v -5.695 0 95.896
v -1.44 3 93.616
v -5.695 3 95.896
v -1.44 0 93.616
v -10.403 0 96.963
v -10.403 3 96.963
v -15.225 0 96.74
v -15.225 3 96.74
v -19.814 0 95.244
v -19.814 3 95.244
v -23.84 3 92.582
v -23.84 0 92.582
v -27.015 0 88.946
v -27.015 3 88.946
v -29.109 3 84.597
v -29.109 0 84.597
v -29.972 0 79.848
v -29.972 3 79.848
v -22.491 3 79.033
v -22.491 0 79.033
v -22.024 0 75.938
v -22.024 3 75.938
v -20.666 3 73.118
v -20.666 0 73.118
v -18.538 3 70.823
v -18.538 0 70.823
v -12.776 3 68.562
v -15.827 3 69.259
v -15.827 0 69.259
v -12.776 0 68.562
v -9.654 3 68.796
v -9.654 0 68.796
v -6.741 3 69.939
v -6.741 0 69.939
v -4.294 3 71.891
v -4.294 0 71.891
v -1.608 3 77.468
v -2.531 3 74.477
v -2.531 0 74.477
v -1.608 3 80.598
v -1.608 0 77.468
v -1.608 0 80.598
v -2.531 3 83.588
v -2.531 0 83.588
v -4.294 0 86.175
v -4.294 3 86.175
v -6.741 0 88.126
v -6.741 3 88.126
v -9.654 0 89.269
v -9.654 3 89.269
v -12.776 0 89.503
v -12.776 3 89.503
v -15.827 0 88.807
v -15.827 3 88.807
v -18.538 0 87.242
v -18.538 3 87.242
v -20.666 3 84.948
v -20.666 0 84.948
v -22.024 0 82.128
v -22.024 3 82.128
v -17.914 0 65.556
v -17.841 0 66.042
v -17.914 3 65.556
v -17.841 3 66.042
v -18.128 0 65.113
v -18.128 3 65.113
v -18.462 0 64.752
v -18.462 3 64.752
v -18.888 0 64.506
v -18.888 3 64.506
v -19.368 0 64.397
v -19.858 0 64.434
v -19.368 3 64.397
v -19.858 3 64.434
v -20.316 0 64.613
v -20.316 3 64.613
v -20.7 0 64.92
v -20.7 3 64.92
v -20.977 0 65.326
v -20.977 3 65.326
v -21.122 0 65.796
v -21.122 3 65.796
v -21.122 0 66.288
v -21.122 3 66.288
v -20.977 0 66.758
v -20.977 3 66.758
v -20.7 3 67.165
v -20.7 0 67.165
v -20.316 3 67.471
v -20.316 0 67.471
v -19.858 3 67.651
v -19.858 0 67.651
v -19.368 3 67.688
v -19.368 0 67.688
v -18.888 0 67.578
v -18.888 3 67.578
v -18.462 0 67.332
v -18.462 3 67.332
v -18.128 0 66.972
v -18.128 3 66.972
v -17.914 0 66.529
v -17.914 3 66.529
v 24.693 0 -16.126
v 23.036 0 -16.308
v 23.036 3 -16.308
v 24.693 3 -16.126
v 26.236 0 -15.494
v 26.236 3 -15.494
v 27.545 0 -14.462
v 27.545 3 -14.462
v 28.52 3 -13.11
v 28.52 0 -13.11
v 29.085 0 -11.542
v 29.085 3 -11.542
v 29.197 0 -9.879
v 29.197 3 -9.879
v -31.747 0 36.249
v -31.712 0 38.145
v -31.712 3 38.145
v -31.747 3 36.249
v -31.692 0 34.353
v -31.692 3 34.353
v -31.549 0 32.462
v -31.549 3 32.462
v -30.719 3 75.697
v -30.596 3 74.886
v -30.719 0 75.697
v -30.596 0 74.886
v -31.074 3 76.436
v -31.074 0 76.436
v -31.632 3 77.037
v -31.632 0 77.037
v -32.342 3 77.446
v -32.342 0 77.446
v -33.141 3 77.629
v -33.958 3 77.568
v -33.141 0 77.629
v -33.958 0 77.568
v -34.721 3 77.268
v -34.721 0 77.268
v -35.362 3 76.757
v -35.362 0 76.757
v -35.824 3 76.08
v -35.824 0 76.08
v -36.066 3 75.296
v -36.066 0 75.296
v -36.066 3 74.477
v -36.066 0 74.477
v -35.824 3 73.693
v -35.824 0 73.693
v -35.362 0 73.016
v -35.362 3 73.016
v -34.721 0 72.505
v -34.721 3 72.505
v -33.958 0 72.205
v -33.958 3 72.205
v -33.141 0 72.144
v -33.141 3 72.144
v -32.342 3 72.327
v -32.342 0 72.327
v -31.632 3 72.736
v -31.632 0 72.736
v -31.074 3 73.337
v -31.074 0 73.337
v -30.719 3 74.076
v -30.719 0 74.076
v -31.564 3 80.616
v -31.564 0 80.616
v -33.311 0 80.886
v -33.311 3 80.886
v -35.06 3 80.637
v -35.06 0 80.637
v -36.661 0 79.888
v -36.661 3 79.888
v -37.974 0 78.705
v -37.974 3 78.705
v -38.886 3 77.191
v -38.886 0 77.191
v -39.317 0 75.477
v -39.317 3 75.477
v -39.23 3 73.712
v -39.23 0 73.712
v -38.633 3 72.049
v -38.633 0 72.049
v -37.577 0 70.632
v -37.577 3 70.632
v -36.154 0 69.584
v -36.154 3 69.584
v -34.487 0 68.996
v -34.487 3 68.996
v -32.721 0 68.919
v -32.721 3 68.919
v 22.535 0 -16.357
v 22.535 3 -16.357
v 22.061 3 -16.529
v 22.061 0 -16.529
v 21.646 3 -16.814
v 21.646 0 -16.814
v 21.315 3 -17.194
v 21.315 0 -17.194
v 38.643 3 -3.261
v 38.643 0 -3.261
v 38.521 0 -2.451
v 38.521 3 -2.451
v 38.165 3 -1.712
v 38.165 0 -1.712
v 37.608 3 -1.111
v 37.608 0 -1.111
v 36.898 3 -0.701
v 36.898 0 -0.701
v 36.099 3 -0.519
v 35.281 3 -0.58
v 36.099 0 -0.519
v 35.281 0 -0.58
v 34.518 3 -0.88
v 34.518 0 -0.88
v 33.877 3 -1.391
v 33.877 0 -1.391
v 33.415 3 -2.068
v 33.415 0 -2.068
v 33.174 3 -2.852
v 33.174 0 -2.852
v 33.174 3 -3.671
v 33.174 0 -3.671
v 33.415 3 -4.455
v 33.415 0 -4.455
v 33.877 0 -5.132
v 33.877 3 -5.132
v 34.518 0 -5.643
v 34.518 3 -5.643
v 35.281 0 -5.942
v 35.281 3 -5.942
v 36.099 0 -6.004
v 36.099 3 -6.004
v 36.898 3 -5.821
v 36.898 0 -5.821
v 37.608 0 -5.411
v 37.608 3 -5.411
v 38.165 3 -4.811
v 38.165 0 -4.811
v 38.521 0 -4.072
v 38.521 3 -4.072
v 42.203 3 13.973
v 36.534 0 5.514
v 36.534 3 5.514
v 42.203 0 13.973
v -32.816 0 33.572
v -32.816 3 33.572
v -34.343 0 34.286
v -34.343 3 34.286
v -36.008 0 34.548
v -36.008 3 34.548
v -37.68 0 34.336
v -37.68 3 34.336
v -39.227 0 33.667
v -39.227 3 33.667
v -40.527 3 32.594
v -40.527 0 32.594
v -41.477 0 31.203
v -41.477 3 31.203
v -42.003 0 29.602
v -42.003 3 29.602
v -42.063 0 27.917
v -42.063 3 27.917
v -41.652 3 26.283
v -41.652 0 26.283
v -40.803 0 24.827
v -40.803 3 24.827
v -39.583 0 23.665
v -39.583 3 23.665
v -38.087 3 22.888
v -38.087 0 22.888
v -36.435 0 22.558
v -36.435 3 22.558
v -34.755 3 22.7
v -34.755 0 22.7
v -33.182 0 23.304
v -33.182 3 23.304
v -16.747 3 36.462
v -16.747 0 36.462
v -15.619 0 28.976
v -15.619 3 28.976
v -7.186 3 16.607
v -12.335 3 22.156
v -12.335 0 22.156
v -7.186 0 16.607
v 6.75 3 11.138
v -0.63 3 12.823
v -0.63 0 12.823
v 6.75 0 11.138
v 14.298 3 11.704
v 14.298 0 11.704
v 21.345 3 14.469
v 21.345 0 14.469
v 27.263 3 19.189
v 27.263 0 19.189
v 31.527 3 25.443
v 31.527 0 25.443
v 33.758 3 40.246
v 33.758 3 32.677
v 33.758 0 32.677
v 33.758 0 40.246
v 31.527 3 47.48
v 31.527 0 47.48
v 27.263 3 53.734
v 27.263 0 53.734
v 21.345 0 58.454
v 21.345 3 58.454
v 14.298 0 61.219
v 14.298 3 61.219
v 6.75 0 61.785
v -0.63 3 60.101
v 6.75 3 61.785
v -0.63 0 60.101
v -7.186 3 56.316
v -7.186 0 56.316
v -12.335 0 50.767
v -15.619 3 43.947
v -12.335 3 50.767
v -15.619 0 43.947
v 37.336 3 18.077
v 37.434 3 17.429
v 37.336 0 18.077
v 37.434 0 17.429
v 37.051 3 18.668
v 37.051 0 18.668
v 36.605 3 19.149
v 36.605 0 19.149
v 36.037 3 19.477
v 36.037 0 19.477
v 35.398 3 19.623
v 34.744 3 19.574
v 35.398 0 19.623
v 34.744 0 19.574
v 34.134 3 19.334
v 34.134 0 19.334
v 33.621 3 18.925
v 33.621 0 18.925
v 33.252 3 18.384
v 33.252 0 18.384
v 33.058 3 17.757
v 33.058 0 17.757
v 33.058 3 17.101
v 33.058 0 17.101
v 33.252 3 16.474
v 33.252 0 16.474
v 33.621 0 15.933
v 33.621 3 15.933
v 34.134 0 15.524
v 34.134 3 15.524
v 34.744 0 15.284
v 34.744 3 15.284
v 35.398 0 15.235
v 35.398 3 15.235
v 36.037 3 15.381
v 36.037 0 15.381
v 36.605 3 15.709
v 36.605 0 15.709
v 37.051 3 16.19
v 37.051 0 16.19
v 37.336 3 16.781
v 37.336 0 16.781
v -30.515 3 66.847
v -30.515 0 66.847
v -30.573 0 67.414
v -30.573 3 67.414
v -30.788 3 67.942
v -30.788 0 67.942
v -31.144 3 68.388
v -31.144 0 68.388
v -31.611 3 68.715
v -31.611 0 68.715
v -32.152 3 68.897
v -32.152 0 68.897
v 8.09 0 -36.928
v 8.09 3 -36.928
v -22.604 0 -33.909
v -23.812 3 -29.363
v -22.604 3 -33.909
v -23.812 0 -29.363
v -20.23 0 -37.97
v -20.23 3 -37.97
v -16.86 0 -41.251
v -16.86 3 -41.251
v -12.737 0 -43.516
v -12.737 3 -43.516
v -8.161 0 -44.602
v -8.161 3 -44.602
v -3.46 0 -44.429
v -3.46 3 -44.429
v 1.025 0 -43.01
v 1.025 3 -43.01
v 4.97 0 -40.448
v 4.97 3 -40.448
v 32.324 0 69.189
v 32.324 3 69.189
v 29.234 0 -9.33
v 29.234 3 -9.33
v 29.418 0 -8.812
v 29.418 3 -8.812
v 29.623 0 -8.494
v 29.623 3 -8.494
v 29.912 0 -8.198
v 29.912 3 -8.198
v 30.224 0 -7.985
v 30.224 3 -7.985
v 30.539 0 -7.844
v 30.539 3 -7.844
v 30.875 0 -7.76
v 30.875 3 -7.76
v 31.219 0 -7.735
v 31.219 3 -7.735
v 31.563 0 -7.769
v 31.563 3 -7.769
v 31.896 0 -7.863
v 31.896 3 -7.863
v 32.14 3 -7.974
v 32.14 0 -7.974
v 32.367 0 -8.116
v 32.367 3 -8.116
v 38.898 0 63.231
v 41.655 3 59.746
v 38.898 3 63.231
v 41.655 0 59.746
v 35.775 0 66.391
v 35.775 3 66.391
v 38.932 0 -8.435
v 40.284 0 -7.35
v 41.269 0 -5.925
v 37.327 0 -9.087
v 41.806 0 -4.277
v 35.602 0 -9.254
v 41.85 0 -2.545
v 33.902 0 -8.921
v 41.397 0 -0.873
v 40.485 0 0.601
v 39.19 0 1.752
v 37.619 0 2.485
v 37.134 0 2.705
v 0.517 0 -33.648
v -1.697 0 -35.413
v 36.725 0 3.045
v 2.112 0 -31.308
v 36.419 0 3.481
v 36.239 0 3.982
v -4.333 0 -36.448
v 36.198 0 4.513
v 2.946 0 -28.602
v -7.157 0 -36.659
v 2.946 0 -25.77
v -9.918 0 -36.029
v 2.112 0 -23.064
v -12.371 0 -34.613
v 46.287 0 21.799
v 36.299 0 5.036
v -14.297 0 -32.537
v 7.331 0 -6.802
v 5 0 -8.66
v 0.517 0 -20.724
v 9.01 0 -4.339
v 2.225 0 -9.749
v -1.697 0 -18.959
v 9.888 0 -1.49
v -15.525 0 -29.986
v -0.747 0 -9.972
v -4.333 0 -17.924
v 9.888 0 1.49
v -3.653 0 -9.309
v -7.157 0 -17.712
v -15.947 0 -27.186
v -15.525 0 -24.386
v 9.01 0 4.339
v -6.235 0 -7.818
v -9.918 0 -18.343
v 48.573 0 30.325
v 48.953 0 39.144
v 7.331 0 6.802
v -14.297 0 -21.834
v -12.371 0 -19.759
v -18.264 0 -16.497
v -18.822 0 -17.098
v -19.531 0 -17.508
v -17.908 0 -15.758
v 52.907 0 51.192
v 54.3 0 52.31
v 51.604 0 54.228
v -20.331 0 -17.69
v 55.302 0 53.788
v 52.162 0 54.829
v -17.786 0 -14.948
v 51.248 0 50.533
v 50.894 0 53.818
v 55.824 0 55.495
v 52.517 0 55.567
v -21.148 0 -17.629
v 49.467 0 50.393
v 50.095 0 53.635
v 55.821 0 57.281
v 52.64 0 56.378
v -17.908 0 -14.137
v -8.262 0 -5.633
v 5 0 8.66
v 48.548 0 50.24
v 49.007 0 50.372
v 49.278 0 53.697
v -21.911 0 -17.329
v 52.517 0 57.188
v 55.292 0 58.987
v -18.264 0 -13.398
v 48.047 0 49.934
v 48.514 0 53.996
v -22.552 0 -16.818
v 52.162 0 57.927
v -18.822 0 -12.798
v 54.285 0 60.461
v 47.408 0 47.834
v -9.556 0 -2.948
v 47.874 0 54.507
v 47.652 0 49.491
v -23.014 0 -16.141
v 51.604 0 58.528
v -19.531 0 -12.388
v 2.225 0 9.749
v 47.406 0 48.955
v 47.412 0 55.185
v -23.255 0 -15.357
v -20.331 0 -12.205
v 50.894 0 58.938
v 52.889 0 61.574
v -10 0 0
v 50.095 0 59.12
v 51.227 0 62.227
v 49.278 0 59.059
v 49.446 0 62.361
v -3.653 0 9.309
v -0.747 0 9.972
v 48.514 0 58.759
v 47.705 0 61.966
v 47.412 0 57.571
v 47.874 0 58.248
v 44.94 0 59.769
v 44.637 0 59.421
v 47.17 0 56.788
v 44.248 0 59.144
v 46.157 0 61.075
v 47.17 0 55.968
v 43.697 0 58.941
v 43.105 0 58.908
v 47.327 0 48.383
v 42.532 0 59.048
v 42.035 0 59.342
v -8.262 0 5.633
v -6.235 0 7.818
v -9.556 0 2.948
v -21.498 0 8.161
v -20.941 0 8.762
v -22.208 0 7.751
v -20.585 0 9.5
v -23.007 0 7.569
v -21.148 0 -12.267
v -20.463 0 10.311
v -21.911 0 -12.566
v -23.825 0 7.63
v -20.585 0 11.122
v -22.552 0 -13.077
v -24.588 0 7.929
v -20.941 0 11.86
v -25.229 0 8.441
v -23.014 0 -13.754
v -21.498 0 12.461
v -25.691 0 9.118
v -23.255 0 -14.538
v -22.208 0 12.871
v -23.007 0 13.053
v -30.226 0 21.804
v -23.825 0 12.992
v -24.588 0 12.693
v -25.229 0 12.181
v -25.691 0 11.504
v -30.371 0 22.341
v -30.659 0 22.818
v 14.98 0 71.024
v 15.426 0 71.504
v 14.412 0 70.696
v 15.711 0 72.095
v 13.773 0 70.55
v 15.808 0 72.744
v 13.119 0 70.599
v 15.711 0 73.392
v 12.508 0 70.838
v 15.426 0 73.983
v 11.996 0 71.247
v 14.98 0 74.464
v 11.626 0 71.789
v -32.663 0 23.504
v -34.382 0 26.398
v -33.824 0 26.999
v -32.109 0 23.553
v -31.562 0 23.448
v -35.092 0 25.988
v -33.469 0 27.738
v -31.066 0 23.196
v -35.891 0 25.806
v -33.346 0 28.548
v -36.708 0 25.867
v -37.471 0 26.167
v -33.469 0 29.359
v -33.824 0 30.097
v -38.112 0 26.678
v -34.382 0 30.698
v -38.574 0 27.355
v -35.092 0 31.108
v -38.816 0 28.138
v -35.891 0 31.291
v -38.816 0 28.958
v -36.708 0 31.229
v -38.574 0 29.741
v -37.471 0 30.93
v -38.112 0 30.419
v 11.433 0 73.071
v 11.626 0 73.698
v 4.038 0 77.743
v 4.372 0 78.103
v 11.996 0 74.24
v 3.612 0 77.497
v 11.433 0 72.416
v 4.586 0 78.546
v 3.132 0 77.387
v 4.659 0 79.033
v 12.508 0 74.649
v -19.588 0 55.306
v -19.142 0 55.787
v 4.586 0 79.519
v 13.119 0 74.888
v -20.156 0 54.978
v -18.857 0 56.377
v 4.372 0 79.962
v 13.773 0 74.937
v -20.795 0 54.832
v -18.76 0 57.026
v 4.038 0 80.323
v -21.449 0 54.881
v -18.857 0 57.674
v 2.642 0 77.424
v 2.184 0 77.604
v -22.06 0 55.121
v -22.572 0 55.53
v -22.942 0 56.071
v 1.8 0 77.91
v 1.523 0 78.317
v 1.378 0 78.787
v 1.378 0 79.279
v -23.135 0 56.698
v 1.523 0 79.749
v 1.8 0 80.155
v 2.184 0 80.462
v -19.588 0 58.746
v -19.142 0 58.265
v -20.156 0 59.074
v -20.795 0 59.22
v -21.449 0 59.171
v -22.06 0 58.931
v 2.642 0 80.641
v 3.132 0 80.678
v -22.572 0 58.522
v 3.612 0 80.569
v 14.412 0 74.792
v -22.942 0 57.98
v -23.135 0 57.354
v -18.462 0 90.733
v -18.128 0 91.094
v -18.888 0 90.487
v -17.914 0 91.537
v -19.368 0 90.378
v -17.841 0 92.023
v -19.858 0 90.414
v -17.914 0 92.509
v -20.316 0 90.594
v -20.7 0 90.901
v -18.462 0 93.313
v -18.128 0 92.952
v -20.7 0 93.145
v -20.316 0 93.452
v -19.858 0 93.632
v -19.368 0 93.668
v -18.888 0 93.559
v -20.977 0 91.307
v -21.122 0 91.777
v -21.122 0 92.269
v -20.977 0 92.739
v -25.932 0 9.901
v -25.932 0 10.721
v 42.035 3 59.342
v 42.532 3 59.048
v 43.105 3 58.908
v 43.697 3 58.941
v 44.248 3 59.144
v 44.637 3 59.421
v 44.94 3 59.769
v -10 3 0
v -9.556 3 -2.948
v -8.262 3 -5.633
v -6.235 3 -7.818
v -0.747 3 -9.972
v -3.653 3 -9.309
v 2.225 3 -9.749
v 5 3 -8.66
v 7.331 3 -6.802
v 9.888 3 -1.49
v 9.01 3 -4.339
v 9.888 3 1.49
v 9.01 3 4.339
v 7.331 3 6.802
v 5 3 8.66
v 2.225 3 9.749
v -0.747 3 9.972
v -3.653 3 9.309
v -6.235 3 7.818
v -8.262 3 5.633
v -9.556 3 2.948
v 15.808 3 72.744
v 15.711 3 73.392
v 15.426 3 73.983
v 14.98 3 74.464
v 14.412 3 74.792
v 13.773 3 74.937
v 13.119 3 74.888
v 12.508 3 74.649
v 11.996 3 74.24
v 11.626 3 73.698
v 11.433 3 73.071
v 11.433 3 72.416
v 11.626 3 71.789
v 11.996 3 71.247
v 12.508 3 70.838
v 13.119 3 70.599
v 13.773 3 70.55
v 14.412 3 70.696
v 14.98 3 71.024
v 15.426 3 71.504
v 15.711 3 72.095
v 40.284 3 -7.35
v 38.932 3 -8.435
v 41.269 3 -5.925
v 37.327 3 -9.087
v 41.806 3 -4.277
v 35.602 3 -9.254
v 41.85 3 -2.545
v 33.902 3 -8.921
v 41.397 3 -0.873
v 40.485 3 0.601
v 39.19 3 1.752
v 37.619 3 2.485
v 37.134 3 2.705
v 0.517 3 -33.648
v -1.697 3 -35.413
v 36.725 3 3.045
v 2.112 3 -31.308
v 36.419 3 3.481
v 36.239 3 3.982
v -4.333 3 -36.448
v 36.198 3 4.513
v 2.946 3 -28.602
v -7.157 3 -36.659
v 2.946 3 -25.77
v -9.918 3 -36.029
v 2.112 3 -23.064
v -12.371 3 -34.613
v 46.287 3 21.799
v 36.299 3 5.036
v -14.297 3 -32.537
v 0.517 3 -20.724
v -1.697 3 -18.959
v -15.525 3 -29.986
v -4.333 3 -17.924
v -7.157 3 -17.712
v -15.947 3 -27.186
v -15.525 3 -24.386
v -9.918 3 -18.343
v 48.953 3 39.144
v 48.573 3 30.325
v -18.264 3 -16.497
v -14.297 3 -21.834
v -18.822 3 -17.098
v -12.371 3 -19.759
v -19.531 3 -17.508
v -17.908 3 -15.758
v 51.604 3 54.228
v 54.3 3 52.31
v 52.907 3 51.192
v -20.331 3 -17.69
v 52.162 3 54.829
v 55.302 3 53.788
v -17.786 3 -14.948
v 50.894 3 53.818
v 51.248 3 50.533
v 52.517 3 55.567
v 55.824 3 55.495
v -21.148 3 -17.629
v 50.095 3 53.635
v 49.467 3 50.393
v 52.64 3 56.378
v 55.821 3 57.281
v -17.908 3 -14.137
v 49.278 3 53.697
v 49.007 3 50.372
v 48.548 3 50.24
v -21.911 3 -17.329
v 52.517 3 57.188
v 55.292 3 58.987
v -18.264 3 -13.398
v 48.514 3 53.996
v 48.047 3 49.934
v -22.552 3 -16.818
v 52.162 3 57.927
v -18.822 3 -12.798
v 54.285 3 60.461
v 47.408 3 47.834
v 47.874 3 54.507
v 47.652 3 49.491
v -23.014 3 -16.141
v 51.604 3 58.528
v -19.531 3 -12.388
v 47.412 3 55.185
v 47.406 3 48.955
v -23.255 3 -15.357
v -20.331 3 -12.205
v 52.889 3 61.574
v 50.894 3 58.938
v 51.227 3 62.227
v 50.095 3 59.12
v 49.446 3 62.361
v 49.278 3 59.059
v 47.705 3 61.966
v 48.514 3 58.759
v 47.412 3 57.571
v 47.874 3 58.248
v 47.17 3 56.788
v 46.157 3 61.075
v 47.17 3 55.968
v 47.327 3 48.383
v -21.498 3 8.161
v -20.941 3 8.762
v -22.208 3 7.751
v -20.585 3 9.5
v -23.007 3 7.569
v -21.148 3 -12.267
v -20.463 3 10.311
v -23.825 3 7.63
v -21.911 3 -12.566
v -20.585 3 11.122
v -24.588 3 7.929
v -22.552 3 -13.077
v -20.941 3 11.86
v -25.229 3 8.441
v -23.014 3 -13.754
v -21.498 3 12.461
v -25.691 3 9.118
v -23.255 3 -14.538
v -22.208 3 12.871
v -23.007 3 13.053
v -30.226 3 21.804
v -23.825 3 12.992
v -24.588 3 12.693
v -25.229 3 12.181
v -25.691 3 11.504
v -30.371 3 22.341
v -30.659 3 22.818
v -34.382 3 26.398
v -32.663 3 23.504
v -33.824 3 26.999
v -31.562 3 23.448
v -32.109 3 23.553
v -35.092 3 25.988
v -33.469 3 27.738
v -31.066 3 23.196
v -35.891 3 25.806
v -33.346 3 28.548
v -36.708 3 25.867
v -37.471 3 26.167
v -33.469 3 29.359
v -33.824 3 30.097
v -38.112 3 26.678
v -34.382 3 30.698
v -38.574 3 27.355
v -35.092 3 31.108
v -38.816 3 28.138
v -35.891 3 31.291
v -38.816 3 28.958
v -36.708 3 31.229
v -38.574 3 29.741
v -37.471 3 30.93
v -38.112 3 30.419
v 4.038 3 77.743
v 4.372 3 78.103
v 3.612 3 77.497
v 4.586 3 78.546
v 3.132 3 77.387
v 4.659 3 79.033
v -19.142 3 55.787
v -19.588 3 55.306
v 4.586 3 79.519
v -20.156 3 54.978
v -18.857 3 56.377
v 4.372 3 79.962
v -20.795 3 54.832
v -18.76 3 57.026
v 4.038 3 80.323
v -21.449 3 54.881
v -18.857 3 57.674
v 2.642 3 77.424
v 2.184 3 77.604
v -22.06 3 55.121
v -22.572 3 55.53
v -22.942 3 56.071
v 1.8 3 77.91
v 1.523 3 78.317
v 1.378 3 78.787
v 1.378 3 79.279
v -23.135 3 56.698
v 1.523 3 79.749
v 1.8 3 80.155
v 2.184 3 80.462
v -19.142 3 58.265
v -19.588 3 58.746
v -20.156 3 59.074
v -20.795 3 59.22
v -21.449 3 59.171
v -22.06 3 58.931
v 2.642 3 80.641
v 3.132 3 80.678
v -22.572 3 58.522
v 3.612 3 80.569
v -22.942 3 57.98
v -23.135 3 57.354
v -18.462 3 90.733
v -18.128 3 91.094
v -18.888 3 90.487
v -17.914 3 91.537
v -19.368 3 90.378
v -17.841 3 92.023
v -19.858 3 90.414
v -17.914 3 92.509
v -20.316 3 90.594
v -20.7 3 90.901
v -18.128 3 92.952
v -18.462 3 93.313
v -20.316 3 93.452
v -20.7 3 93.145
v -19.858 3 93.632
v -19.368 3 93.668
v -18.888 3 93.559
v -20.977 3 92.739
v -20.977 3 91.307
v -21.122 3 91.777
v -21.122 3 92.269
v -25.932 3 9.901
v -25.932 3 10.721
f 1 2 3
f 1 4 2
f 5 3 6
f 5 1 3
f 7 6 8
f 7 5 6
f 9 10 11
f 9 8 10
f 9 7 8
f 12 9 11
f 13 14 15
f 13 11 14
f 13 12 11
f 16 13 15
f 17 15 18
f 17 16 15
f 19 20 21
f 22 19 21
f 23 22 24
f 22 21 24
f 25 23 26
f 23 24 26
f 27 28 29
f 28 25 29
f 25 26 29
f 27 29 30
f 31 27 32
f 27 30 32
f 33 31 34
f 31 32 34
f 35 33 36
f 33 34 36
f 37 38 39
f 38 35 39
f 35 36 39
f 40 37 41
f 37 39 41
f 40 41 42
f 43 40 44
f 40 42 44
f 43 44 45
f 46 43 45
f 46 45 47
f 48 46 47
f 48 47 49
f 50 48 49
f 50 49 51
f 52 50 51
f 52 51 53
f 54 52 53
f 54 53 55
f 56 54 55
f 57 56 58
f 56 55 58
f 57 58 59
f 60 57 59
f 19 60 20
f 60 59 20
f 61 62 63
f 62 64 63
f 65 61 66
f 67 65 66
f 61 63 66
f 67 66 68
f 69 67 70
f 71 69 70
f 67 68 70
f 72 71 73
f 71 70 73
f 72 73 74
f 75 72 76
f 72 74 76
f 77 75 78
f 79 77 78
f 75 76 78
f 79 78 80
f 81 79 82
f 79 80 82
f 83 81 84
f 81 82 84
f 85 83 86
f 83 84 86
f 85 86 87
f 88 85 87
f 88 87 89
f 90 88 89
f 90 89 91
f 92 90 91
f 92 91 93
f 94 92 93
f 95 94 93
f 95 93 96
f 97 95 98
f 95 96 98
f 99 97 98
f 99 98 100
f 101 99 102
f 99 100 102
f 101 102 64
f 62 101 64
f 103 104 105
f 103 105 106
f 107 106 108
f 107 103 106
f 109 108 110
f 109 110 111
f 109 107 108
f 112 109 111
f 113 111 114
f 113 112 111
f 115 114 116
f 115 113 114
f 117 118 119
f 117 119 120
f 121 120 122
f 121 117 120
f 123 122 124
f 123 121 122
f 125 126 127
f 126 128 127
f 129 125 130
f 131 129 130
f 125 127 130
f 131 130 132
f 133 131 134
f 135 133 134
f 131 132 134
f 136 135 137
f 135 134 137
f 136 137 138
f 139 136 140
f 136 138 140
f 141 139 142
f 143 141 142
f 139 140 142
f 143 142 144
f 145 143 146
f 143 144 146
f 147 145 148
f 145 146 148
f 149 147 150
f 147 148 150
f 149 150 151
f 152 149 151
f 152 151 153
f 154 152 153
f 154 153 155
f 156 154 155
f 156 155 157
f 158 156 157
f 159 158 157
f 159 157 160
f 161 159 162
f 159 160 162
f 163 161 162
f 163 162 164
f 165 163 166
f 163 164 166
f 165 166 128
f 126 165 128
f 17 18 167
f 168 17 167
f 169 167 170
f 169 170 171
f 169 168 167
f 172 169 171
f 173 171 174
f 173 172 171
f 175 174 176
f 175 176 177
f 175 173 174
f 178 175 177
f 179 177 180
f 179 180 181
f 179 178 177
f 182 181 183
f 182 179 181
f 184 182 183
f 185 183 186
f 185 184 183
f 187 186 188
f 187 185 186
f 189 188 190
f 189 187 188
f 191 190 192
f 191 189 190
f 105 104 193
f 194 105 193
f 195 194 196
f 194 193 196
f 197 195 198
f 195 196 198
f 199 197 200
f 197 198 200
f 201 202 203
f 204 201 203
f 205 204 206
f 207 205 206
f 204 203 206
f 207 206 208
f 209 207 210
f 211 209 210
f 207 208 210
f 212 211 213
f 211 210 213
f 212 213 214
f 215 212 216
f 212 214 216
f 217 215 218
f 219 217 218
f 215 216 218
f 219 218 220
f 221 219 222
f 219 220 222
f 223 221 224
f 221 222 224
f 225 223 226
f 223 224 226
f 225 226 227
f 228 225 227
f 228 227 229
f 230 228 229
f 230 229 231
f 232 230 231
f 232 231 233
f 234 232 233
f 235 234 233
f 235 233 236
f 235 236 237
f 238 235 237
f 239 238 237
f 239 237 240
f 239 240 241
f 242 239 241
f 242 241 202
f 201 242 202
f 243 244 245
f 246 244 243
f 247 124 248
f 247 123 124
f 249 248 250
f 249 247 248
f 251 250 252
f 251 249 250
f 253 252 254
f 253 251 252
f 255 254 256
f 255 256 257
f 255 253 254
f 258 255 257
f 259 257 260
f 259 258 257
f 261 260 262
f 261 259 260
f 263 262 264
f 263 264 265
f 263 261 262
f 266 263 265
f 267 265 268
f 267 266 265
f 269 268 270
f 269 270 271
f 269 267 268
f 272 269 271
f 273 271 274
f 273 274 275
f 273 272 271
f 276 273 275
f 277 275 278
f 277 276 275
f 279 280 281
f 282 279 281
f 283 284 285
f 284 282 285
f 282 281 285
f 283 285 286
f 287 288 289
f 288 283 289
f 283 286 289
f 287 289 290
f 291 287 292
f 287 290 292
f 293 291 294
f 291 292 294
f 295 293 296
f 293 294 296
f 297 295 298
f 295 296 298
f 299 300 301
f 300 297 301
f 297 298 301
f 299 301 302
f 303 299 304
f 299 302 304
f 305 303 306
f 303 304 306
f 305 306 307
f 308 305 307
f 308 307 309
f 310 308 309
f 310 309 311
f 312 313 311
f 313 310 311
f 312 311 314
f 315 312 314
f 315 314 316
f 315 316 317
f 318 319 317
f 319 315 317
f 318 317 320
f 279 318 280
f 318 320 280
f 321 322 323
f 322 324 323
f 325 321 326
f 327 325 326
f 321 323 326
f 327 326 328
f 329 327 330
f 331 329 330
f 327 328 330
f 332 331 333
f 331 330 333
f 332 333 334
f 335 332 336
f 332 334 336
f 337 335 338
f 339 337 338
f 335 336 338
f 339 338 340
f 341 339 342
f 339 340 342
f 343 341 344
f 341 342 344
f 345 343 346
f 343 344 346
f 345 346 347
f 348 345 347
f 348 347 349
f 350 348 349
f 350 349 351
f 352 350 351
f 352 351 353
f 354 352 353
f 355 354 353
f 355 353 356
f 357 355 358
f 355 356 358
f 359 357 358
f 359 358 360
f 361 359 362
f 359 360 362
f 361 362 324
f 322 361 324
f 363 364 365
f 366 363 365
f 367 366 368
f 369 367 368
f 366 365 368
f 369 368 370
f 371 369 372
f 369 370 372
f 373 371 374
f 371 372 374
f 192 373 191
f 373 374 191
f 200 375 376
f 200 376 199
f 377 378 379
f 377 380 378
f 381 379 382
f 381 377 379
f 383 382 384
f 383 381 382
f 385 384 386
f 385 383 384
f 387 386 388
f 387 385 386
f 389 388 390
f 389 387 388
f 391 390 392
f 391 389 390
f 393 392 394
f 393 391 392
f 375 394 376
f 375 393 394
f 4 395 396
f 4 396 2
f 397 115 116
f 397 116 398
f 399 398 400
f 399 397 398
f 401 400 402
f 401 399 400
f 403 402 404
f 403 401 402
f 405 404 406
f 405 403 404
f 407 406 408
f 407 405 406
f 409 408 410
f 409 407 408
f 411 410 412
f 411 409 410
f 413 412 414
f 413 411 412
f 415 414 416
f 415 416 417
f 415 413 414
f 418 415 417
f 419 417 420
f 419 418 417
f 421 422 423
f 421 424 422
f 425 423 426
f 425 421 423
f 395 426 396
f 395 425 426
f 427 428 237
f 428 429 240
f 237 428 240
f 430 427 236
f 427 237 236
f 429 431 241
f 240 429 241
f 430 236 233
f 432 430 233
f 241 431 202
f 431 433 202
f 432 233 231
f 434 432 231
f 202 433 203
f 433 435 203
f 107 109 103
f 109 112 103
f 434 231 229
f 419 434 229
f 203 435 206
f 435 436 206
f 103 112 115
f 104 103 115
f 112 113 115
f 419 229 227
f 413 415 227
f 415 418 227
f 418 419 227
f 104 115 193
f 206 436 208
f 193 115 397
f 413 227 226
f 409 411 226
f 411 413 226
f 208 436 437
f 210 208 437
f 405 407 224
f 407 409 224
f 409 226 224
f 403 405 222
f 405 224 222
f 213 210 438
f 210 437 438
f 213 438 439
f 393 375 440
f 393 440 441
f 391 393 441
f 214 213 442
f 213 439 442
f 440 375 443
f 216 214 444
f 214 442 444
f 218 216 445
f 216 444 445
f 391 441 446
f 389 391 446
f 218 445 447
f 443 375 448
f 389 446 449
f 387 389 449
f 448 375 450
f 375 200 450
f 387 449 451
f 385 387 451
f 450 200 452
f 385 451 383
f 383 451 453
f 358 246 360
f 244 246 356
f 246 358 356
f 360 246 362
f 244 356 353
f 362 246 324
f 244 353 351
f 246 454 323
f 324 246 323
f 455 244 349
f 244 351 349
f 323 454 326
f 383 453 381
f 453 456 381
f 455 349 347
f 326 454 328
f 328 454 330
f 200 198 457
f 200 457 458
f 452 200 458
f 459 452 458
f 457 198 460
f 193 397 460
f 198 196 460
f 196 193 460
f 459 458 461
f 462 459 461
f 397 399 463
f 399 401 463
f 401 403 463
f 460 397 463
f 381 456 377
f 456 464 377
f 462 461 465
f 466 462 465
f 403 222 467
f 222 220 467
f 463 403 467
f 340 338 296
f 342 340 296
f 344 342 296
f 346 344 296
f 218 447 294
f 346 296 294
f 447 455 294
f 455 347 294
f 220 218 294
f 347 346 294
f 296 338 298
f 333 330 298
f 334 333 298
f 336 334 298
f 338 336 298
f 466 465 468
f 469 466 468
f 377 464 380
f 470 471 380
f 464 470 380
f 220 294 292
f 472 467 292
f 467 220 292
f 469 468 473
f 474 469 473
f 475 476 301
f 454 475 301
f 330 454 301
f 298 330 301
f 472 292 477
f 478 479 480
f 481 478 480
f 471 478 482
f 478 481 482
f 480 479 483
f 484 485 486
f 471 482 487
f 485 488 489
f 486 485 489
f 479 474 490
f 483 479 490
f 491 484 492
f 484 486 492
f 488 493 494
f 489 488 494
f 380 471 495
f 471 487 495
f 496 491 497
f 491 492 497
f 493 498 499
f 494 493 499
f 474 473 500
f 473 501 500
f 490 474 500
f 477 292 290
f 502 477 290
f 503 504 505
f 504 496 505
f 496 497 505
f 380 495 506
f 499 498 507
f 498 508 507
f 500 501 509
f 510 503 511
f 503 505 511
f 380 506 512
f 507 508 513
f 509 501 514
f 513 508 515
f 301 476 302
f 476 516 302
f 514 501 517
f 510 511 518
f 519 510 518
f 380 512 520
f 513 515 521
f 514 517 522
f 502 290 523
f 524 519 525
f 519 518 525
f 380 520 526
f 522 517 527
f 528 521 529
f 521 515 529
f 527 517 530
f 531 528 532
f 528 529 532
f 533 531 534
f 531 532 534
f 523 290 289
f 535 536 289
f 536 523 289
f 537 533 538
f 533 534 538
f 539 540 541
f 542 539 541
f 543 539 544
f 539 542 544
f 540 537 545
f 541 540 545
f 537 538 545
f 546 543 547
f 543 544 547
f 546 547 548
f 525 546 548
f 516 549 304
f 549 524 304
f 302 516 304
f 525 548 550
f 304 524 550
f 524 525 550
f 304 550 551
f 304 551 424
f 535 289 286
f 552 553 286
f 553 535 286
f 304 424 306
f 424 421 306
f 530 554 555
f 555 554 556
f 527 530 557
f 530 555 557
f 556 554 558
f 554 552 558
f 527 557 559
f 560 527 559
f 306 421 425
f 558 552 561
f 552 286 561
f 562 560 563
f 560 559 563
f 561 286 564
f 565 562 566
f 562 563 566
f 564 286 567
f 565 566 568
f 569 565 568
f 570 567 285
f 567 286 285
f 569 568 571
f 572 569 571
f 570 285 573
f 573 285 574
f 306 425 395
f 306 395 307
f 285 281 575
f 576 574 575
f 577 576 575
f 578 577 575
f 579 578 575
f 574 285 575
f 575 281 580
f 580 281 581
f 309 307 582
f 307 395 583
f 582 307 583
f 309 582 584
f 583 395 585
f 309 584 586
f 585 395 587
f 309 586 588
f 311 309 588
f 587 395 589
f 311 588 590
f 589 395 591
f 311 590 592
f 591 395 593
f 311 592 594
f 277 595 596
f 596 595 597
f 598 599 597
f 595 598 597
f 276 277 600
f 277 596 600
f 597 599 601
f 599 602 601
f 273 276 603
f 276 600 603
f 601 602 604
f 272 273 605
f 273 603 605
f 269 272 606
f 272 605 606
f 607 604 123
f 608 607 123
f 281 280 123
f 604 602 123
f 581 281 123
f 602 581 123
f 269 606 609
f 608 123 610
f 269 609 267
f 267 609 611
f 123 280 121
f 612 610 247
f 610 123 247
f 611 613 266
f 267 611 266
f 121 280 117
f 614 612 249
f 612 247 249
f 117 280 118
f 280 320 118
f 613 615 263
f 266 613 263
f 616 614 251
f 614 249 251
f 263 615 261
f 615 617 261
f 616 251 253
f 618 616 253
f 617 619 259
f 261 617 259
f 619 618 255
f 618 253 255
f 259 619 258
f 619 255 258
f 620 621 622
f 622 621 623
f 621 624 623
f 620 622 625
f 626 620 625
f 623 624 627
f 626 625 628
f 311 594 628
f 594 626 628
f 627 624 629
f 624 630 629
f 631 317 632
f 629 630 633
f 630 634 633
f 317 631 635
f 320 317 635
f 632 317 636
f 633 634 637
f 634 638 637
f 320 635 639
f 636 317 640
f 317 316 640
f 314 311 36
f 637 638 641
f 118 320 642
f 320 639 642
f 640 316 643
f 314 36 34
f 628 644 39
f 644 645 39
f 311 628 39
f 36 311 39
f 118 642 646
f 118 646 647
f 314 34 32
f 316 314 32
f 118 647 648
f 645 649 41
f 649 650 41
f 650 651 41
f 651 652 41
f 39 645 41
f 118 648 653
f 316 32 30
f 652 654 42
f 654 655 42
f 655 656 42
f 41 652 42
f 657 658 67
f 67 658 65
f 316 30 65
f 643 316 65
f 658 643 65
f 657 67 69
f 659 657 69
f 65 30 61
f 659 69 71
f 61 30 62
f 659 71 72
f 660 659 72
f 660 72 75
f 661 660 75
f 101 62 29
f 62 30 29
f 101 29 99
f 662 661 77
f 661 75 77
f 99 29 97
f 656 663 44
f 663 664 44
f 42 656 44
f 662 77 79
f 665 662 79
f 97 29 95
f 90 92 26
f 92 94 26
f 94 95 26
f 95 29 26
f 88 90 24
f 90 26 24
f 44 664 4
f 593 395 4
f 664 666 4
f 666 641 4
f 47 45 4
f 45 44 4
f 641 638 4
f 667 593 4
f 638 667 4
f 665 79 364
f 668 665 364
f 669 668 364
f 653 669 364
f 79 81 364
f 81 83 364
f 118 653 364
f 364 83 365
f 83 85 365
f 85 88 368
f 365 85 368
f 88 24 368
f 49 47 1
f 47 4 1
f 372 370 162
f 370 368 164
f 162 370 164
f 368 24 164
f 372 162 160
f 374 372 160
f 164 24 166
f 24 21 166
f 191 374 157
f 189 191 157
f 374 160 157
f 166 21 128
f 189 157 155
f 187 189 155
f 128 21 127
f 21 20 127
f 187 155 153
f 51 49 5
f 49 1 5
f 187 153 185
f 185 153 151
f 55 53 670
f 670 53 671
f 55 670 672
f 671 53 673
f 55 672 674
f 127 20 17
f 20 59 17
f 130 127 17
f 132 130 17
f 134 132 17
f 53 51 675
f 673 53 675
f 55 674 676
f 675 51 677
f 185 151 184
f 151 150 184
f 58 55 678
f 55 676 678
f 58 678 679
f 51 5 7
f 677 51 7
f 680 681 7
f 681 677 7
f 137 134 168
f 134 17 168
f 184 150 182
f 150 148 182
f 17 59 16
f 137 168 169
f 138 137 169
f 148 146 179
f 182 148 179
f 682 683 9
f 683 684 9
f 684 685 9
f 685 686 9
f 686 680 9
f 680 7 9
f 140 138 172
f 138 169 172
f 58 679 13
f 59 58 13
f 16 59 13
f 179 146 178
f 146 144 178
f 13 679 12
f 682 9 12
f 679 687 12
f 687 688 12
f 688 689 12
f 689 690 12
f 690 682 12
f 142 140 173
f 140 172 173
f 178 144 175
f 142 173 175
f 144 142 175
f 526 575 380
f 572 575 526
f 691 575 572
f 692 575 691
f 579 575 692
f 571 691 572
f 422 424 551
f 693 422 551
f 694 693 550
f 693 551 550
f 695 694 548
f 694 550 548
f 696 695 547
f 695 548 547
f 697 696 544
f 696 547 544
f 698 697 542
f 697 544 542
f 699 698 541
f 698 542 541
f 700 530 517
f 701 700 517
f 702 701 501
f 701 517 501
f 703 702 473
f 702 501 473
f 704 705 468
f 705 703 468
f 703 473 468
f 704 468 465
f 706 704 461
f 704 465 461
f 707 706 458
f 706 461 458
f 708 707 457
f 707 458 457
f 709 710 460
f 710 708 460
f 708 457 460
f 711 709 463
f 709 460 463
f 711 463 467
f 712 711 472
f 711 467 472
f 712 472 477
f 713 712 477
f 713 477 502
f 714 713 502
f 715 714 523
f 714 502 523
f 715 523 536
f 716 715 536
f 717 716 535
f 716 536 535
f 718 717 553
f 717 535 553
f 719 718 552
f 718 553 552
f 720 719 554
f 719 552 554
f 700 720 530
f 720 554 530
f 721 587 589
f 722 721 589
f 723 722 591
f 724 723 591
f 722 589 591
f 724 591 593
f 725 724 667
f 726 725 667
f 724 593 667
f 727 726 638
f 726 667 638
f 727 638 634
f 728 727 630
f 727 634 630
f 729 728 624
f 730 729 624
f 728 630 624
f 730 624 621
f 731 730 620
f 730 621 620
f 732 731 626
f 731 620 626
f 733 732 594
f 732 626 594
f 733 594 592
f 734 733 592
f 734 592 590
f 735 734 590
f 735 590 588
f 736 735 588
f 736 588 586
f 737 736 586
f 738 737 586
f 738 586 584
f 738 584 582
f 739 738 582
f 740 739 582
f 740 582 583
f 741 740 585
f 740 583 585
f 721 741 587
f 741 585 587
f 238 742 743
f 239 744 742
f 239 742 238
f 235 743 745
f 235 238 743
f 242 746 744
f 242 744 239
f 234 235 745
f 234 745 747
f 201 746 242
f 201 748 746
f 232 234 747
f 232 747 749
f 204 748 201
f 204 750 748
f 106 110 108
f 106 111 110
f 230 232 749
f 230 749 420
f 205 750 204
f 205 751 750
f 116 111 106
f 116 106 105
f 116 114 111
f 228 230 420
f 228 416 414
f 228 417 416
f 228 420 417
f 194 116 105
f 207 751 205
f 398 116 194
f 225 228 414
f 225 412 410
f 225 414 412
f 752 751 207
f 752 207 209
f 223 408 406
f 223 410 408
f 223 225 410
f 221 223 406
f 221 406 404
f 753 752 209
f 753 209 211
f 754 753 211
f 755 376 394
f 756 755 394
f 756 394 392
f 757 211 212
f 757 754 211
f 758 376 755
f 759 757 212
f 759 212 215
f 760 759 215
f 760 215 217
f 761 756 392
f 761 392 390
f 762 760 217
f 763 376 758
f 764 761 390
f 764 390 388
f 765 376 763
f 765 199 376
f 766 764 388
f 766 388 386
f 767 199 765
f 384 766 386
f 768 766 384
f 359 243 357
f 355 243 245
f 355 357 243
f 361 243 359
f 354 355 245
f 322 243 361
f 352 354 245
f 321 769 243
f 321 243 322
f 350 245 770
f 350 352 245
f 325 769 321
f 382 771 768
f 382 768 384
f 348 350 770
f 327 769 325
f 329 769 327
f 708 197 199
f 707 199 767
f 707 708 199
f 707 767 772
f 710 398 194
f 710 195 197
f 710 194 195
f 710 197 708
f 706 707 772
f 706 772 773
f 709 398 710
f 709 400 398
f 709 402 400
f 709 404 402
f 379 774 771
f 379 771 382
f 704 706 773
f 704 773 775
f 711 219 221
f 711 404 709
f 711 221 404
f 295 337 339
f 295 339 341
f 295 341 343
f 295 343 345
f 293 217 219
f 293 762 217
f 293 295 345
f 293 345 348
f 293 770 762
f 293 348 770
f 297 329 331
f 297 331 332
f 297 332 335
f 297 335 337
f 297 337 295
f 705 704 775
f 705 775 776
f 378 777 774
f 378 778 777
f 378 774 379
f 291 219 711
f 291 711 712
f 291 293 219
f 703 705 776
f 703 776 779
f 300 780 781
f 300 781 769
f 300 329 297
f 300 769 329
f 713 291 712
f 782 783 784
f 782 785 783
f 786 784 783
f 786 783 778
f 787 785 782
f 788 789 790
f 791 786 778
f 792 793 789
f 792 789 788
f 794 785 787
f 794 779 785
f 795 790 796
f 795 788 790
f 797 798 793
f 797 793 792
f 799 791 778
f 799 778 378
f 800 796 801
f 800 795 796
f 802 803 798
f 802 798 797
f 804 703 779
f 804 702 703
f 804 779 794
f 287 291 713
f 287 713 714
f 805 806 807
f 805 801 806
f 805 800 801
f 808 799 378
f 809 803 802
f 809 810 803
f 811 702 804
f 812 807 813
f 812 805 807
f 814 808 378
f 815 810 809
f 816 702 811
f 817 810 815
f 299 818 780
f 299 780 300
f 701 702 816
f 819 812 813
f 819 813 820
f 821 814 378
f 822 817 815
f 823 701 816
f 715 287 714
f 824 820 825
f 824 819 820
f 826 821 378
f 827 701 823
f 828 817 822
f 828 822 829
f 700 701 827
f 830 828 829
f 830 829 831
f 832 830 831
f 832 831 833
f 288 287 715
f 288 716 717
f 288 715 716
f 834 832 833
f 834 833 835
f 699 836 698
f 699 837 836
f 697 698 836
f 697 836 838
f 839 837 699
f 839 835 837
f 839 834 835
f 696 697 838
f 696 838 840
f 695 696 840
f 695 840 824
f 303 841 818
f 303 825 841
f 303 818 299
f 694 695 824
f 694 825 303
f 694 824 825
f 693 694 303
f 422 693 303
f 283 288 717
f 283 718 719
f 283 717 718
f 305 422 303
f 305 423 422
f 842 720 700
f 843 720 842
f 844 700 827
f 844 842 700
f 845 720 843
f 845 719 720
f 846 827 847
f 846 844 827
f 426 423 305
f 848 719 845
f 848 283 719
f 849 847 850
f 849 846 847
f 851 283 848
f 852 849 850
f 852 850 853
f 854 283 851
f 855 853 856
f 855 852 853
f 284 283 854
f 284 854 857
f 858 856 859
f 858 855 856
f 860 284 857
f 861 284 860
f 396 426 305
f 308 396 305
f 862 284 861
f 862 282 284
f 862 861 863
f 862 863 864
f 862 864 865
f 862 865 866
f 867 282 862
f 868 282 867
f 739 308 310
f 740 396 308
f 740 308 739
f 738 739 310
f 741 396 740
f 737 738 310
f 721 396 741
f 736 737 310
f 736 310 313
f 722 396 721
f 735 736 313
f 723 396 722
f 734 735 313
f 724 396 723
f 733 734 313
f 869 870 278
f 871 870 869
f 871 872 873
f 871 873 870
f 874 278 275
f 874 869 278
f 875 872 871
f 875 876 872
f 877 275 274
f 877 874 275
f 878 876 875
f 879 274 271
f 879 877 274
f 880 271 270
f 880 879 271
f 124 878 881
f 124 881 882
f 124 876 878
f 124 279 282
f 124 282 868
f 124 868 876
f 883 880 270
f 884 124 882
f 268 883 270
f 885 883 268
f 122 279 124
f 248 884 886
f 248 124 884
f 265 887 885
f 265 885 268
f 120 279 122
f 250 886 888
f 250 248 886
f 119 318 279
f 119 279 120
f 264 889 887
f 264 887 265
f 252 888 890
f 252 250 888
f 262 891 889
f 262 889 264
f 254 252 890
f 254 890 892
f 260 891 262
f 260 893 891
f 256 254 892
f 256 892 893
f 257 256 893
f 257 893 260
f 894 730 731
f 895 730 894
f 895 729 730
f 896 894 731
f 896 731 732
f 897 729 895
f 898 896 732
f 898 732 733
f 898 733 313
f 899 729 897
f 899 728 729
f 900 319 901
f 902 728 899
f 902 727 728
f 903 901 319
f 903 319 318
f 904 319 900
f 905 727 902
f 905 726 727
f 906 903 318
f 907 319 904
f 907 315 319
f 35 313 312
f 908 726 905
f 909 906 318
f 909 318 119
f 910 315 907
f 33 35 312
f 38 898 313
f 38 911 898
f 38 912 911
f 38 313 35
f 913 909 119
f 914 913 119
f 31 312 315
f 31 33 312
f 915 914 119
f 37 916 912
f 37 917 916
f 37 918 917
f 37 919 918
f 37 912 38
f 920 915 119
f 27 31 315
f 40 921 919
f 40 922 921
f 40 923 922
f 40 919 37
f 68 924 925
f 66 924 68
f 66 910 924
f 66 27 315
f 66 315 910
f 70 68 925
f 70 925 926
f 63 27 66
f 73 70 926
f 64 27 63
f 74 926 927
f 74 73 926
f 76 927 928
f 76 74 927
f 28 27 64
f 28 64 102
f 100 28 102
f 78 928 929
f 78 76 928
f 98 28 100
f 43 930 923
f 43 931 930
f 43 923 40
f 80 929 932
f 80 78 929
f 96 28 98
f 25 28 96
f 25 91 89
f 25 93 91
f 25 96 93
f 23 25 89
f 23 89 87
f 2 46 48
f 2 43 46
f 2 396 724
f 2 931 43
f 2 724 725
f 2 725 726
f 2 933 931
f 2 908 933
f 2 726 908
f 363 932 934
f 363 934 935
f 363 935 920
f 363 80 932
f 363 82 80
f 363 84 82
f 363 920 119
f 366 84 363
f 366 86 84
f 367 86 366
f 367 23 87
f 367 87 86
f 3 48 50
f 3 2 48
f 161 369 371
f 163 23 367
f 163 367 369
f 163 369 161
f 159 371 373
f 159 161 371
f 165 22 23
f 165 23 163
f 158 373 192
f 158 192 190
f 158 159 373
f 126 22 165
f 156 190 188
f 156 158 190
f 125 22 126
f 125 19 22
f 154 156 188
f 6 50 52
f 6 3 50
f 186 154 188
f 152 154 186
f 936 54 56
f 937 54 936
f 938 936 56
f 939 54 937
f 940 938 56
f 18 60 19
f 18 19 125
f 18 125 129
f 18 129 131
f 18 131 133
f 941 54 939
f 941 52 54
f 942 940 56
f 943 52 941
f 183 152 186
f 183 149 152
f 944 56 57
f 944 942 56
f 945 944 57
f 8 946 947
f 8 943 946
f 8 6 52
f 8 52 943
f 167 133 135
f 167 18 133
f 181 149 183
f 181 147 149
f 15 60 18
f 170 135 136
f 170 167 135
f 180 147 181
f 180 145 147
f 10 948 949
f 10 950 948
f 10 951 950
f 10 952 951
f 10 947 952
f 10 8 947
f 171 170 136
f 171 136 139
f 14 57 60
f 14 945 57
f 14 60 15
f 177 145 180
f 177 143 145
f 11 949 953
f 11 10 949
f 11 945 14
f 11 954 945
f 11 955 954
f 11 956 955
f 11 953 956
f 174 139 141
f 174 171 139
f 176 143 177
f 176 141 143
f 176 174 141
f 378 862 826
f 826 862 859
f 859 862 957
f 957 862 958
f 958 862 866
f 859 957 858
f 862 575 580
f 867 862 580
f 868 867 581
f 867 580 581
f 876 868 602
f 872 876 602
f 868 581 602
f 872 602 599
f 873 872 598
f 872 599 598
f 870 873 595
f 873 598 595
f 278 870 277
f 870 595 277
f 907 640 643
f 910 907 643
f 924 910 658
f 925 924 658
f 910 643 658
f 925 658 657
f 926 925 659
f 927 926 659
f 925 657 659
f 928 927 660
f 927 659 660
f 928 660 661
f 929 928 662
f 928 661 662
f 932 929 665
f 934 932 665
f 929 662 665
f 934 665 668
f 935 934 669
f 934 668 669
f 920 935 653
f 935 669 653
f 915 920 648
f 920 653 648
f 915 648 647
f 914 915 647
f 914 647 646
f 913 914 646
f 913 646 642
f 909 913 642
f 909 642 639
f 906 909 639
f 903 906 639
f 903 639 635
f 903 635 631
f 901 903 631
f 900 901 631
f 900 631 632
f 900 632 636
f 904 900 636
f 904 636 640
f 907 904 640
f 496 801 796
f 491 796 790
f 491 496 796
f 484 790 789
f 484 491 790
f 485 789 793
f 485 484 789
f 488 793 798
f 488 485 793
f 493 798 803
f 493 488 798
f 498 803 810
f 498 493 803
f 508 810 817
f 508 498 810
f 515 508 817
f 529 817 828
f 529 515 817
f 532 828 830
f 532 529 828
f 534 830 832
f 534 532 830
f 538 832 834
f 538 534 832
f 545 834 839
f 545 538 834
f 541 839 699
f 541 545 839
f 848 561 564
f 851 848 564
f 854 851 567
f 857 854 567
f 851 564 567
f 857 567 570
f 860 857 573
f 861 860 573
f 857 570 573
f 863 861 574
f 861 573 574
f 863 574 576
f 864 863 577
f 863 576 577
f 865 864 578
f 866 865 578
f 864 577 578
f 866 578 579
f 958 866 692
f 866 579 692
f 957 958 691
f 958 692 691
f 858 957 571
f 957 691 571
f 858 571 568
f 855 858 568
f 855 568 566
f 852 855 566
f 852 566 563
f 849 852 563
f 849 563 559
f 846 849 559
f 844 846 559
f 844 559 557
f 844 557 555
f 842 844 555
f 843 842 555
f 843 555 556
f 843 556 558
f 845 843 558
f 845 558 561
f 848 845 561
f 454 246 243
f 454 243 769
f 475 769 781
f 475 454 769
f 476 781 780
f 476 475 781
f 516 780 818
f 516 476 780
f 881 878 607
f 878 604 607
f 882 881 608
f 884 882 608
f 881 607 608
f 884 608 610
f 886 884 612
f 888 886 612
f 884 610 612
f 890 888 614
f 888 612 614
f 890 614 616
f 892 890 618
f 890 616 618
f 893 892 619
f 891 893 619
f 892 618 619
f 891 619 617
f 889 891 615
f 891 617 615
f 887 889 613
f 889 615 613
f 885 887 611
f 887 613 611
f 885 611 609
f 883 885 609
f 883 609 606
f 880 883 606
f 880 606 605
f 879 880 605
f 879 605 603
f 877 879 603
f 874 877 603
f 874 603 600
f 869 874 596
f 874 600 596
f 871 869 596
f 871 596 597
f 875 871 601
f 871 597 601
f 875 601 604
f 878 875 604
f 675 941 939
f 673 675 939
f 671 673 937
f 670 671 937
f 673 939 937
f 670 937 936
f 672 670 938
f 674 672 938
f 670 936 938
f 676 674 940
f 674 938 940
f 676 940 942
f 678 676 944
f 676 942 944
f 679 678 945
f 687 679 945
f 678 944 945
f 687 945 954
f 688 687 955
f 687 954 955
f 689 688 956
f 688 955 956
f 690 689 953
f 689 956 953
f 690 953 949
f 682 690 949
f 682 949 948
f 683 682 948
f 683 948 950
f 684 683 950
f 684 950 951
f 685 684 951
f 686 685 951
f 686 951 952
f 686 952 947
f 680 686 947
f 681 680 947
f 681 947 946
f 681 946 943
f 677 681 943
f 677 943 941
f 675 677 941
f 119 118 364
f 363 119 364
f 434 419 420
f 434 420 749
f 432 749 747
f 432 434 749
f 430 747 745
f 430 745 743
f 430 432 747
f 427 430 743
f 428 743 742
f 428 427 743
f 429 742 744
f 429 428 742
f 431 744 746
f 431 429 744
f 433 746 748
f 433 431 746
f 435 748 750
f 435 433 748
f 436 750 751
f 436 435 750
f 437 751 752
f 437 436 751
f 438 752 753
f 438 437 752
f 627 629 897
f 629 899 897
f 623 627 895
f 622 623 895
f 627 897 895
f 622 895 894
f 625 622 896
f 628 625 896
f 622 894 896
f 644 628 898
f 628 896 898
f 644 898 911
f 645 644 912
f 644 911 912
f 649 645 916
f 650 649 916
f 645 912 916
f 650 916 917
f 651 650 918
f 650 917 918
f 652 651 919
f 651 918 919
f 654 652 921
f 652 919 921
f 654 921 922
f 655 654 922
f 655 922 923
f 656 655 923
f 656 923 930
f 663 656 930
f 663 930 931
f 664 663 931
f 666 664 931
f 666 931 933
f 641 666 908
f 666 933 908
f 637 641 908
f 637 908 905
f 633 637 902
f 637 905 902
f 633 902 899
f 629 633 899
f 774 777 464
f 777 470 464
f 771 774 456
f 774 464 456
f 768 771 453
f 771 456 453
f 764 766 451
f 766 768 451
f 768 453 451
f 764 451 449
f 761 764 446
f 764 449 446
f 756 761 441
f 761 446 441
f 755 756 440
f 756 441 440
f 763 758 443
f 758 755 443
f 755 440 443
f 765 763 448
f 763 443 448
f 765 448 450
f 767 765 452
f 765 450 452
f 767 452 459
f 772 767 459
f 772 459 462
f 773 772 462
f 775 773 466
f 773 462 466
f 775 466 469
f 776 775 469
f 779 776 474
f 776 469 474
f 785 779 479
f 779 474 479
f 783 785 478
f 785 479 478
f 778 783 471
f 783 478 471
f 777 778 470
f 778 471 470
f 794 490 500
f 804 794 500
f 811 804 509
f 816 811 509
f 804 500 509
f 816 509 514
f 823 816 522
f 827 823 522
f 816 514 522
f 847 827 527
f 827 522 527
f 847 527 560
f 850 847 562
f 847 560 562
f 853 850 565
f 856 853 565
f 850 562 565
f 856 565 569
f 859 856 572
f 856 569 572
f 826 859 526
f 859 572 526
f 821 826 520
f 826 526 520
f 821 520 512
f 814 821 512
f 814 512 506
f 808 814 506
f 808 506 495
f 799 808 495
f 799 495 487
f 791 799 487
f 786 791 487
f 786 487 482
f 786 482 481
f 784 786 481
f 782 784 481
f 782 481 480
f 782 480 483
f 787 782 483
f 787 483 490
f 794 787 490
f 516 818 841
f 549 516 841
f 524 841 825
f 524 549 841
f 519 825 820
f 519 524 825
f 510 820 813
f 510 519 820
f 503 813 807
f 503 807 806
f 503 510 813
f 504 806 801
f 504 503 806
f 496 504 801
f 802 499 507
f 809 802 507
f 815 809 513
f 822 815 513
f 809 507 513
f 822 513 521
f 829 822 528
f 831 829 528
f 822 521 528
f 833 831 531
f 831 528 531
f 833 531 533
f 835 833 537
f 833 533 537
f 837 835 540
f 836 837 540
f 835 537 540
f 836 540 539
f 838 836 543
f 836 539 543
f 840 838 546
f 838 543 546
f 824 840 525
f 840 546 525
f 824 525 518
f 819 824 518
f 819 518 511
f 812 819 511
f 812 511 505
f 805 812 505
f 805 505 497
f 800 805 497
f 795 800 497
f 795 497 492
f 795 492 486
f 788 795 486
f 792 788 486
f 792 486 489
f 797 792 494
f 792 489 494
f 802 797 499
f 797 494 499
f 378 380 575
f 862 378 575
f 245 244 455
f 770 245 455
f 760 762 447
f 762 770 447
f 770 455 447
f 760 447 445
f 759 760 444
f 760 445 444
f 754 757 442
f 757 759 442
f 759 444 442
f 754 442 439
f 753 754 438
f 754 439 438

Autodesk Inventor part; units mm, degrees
ref_plane "YZ Plane" through (0, 0, 0) normal (1, 0, 0) x (0, 1, 0)
ref_plane "XZ Plane" through (0, 0, 0) normal (0, 1, 0) x (-1, 0, 0)
ref_plane "XY Plane" through (0, 0, 0) normal (0, 0, 1) x (1, 0, 0)
sketch "Sketch1" plane through (0, 0, 0) normal (0, 1, 0) x (-1, 0, 0)
  circle A0 centre (0, 0) radius 10
  circle A1 centre (11.9909, 79.0327) radius 10 construction
  circle A2 centre (11.9909, 79.0327) radius 10.5
  circle A3 centre (-8.6473, 36.4616) radius 22.3944 construction
  circle A4 centre (-8.6473, 36.4616) radius 25.3944
  circle A5 centre (6.4474, -27.1859) radius 9.5 projected
  arc A6 (1.4403, 93.6164) -> (29.9753, 79.7828) centre (11.9909, 79.0327) ccw construction
  arc A7 (-42.203, 13.9734) -> (31.4334, 31.4371) centre (-8.6473, 36.4616) ccw construction
  arc A8 (23.8115, -29.3627) -> (-8.0899, -36.9284) centre (6.4474, -27.1859) ccw construction
  line L0 (-8.0899, -36.9284) -> (-42.203, 13.9734)
  line L1 (23.8115, -29.3627) -> (31.4334, 31.4371)
  line L2 (-32.3242, 69.1894) -> (1.4403, 93.6164)
  line L3 (31.712, 38.145) -> (29.9753, 79.7828)
  arc A9 (29.9753, 79.7828) -> (1.4403, 93.6164) centre (11.9909, 79.0327) ccw
  arc A10 (-32.3242, 69.1894) -> (-42.203, 13.9734) centre (-8.6473, 36.4616) ccw
  arc A11 (31.712, 38.145) -> (-32.3242, 69.1894) centre (-8.6473, 36.4616) ccw construction
  arc A12 (31.4334, 31.4371) -> (31.712, 38.145) centre (-8.6473, 36.4616) ccw
  arc A13 (-8.0899, -36.9284) -> (23.8115, -29.3627) centre (6.4474, -27.1859) ccw
  dimension "d0" = 20
  dimension "d5" = 0.5
  dimension "d6" = 3
  dimension "d7" = 8
  dimension "d8" = 15
  dimension "d9" = 8
extrude "Extrusion1" add sketch "Sketch1" along normal blind 3
sketch "Sketch2" plane through (0, 0, 0) normal (0, -1, 0) x (1, 0, 0)
  circle A0 centre (35.2337, 17.429) radius 2.2
  circle A1 centre (-20.9595, 57.0259) radius 2.2
  circle A2 centre (13.6085, 72.7436) radius 2.2
  point P0 (0, 0)
  dimension "d12" = 4.4
  dimension "d13" = 4.4
  dimension "d14" = 4.4
extrude "Extrusion2" cut sketch "Sketch2" against normal blind 5
sketch "Sketch3" plane through (0, 0, 0) normal (0, -1, 0) x (1, 0, 0)
  circle A0 centre (35.893, -3.2614) radius 2.75
  circle A1 centre (35.893, -3.2614) radius 6
  circle A2 centre (49.8895, 56.3777) radius 2.75
  circle A3 centre (49.8895, 56.3777) radius 6
  circle A4 centre (-36.0964, 28.5483) radius 2.75
  circle A5 centre (-36.0964, 28.5483) radius 6
  circle A6 centre (-33.3464, 74.8865) radius 2.75
  circle A7 centre (-33.3464, 74.8865) radius 6
  point P0 (0, 0)
  dimension "d18" = 5.5
  dimension "d19" = 12
  dimension "d20" = 5.5
  dimension "d21" = 12
  dimension "d22" = 5.5
  dimension "d23" = 12
  dimension "d24" = 5.5
  dimension "d25" = 12
extrude "Extrusion3" add sketch "Sketch3" against normal blind 3
fillet "Fillet1" radius 2 6 edges at (29.978, 1.5, -4.268) (34.5756, 1.5, 2.5922) (46.0191, 1.5, 51.793) (43.8922, 1.5, 56.1973) (-30.3974, 1.5, 69.6612) (-30.7339, 1.5, 25.857)
sketch "Sketch4" plane through (0, 0, 0) normal (0, -1, 0) x (1, 0, 0)
  circle A0 centre (23.213, -10.311) radius 2.413 projected
  circle A1 centre (-23.213, 10.311) radius 2.413 projected
  circle A2 centre (-20.5361, -14.9476) radius 2.413 projected
  circle A3 centre (23.213, -10.311) radius 2.75
  circle A4 centre (-23.213, 10.311) radius 2.75
  circle A5 centre (-20.5361, -14.9476) radius 2.75
  point P0 (0, 0)
  dimension "d29" = 5.5
  dimension "d30" = 5.5
  dimension "d31" = 5.5
extrude "Extrusion4" cut sketch "Sketch4" against normal through all contours A0 | A1 | A2 | A3 | A4 | A5
sketch "Sketch5" plane through (0, 0, 0) normal (0, -1, 0) x (1, 0, 0)
  circle A0 centre (23.213, -10.311) radius 2.75 projected
  circle A1 centre (23.213, -10.311) radius 2.75
  circle A2 centre (23.213, -10.311) radius 6
  point P0 (0, 0)
  point P1 (25.9625, -10.2598)
  point P2 (24.2108, -12.8736)
  dimension "d34" = 12
extrude "Extrusion5" add sketch "Sketch5" against normal blind 3 contours A0 | A2
fillet "Fillet2" radius 2 2 edges at (28.1941, 1.5, -6.966) (21.9914, 1.5, -16.1853)
sketch "Sketch6" plane through (0, 3, 0) normal (0, 1, 0) x (1, 0, 0)
  circle A0 centre (-11.9909, -79.0327) radius 10.5 projected
  circle A1 centre (3.0091, -79.0327) radius 1.65
  line L0 (3.0091, -79.0327) -> (-11.9909, -79.0327) construction
  circle A2 centre (-19.4909, -66.0423) radius 1.65
  circle A3 centre (-19.4909, -92.023) radius 1.65
  point P0 (0, 0)
  dimension "d38" = 3.3
  dimension "d39" = 15
  dimension "d42" = 360
extrude "Extrusion6" cut sketch "Sketch6" against normal blind 10 contours A1 | A2 | A3
properties part number "Motor Mount Plate" material "Aluminum 6061"
